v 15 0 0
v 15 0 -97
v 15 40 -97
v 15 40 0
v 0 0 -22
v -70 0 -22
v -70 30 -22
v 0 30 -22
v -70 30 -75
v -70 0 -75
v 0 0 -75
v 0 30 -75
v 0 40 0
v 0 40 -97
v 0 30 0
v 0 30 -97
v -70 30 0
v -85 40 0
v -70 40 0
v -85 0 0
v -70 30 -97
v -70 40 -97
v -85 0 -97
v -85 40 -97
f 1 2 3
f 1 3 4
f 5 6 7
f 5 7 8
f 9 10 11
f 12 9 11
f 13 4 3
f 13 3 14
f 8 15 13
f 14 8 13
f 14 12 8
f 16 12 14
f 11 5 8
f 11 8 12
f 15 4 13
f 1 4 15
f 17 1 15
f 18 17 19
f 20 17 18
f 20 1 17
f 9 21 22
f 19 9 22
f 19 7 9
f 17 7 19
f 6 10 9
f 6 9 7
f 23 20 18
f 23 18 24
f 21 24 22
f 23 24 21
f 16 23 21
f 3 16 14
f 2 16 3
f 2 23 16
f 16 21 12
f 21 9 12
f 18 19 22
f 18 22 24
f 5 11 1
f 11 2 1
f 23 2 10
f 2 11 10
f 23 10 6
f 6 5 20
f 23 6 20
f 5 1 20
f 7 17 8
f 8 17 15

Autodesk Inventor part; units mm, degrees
ref_plane "YZ Plane" through (0, 0, 0) normal (1, 0, 0) x (0, 1, 0)
ref_plane "XZ Plane" through (0, 0, 0) normal (0, 1, 0) x (-1, 0, 0)
ref_plane "XY Plane" through (0, 0, 0) normal (0, 0, 1) x (1, 0, 0)
sketch "Szkic1" plane through (0, 0, 0) normal (0, 1, 0) x (-1, 0, 0)
  line L0 (0, 0) -> (0, -97)
  line L1 (0, -97) -> (70, -97)
  line L2 (70, -97) -> (70, 0)
  line L3 (70, 0) -> (0, 0)
  line L4 (70, 0) -> (85, 0)
  line L5 (85, 0) -> (85, -97)
  line L6 (85, -97) -> (70, -97)
  line L7 (0, -97) -> (-15, -97)
  line L8 (-15, -97) -> (-15, 0)
  line L9 (-15, 0) -> (0, 0)
  line L10 (70, 0) -> (70, -25)
  line L11 (70, -25) -> (0, -25)
  line L12 (70, -97) -> (70, -72)
  line L13 (70, -72) -> (0, -72)
  line L14 (70, -48.5) -> (70, -72.5)
  line L15 (70, -48.5) -> (70, -24.5)
  line L16 (0, -48.5) -> (0, -72.5)
  line L17 (0, -48.5) -> (0, -24.5)
  dimension "d0" = 97
  dimension "d1" = 70
  dimension "d2" = 15
  dimension "d3" = 15
  dimension "d4" = 25
  dimension "d5" = 25
  dimension "d6" = 24
  dimension "d7" = 24
  dimension "d8" = 24
  dimension "d9" = 24
extrude "Wyciągnięcie proste1" add sketch "Szkic1" along normal blind 40 contours L0 L7 L8 L9 | L4 L5 L6 L2
sketch "Szkic2" plane through (0, 40, 0) normal (0, 1, 0) x (1, 0, 0)
  point P0 (0, 0)
sketch "Szkic3" plane through (0, 0, 0) normal (0, -1, 0) x (1, 0, 0)
  line L0 (-70, 0) -> (-70, -97) projected
  line L1 (-70, 0) -> (-70, -22)
  line L2 (-70, -22) -> (0, -22)
  line L3 (0, -97) -> (0, 0) projected
  line L4 (0, -22) -> (0, 0)
  line L5 (0, 0) -> (-70, 0)
  line L6 (-70, -97) -> (-70, -75)
  line L7 (-70, -75) -> (0, -75)
  line L8 (0, -97) -> (-70, -97)
  dimension "d12" = 22
  dimension "d13" = 22
extrude "Wyciągnięcie proste2" add sketch "Szkic3" against normal blind 30 contours L5 L3 L2 L0 | L7 L3 L8 L0
sketch "Szkic4" plane through (-85, 0, -97) normal (-1, 0, 0) x (0, 0, 1)
  line L0 (0, 0) -> (97, 0) projected
  line L1 (0, 0) -> (48.5, 0)
  line L2 (48.5, 0) -> (72.5, 0)
  line L3 (75, 0) -> (22, 0) projected
  line L4 (48.5, 0) -> (24.5, 0)
  line L5 (0, 0) -> (0, 40) projected
  line L6 (24.5, 0) -> (0, 0)
  line L7 (24.5, 0) -> (24.5, 15.2326)
  line L8 (24.5, 0) -> (39.7326, 0) construction
  line L9 (24.5, 0) -> (24.5, 20)
  circle A0 centre (24.5, 20) radius 20
  line L10 (24.5, 20) -> (72.5, 20)
  circle A1 centre (72.5, 20) radius 20
  dimension "d16" = 48.5
  dimension "d17" = 24
  dimension "d18" = 24
  dimension "d19" = 90
  dimension "d20" = 20
  dimension "d21" = 48
properties part number "podwozie"
